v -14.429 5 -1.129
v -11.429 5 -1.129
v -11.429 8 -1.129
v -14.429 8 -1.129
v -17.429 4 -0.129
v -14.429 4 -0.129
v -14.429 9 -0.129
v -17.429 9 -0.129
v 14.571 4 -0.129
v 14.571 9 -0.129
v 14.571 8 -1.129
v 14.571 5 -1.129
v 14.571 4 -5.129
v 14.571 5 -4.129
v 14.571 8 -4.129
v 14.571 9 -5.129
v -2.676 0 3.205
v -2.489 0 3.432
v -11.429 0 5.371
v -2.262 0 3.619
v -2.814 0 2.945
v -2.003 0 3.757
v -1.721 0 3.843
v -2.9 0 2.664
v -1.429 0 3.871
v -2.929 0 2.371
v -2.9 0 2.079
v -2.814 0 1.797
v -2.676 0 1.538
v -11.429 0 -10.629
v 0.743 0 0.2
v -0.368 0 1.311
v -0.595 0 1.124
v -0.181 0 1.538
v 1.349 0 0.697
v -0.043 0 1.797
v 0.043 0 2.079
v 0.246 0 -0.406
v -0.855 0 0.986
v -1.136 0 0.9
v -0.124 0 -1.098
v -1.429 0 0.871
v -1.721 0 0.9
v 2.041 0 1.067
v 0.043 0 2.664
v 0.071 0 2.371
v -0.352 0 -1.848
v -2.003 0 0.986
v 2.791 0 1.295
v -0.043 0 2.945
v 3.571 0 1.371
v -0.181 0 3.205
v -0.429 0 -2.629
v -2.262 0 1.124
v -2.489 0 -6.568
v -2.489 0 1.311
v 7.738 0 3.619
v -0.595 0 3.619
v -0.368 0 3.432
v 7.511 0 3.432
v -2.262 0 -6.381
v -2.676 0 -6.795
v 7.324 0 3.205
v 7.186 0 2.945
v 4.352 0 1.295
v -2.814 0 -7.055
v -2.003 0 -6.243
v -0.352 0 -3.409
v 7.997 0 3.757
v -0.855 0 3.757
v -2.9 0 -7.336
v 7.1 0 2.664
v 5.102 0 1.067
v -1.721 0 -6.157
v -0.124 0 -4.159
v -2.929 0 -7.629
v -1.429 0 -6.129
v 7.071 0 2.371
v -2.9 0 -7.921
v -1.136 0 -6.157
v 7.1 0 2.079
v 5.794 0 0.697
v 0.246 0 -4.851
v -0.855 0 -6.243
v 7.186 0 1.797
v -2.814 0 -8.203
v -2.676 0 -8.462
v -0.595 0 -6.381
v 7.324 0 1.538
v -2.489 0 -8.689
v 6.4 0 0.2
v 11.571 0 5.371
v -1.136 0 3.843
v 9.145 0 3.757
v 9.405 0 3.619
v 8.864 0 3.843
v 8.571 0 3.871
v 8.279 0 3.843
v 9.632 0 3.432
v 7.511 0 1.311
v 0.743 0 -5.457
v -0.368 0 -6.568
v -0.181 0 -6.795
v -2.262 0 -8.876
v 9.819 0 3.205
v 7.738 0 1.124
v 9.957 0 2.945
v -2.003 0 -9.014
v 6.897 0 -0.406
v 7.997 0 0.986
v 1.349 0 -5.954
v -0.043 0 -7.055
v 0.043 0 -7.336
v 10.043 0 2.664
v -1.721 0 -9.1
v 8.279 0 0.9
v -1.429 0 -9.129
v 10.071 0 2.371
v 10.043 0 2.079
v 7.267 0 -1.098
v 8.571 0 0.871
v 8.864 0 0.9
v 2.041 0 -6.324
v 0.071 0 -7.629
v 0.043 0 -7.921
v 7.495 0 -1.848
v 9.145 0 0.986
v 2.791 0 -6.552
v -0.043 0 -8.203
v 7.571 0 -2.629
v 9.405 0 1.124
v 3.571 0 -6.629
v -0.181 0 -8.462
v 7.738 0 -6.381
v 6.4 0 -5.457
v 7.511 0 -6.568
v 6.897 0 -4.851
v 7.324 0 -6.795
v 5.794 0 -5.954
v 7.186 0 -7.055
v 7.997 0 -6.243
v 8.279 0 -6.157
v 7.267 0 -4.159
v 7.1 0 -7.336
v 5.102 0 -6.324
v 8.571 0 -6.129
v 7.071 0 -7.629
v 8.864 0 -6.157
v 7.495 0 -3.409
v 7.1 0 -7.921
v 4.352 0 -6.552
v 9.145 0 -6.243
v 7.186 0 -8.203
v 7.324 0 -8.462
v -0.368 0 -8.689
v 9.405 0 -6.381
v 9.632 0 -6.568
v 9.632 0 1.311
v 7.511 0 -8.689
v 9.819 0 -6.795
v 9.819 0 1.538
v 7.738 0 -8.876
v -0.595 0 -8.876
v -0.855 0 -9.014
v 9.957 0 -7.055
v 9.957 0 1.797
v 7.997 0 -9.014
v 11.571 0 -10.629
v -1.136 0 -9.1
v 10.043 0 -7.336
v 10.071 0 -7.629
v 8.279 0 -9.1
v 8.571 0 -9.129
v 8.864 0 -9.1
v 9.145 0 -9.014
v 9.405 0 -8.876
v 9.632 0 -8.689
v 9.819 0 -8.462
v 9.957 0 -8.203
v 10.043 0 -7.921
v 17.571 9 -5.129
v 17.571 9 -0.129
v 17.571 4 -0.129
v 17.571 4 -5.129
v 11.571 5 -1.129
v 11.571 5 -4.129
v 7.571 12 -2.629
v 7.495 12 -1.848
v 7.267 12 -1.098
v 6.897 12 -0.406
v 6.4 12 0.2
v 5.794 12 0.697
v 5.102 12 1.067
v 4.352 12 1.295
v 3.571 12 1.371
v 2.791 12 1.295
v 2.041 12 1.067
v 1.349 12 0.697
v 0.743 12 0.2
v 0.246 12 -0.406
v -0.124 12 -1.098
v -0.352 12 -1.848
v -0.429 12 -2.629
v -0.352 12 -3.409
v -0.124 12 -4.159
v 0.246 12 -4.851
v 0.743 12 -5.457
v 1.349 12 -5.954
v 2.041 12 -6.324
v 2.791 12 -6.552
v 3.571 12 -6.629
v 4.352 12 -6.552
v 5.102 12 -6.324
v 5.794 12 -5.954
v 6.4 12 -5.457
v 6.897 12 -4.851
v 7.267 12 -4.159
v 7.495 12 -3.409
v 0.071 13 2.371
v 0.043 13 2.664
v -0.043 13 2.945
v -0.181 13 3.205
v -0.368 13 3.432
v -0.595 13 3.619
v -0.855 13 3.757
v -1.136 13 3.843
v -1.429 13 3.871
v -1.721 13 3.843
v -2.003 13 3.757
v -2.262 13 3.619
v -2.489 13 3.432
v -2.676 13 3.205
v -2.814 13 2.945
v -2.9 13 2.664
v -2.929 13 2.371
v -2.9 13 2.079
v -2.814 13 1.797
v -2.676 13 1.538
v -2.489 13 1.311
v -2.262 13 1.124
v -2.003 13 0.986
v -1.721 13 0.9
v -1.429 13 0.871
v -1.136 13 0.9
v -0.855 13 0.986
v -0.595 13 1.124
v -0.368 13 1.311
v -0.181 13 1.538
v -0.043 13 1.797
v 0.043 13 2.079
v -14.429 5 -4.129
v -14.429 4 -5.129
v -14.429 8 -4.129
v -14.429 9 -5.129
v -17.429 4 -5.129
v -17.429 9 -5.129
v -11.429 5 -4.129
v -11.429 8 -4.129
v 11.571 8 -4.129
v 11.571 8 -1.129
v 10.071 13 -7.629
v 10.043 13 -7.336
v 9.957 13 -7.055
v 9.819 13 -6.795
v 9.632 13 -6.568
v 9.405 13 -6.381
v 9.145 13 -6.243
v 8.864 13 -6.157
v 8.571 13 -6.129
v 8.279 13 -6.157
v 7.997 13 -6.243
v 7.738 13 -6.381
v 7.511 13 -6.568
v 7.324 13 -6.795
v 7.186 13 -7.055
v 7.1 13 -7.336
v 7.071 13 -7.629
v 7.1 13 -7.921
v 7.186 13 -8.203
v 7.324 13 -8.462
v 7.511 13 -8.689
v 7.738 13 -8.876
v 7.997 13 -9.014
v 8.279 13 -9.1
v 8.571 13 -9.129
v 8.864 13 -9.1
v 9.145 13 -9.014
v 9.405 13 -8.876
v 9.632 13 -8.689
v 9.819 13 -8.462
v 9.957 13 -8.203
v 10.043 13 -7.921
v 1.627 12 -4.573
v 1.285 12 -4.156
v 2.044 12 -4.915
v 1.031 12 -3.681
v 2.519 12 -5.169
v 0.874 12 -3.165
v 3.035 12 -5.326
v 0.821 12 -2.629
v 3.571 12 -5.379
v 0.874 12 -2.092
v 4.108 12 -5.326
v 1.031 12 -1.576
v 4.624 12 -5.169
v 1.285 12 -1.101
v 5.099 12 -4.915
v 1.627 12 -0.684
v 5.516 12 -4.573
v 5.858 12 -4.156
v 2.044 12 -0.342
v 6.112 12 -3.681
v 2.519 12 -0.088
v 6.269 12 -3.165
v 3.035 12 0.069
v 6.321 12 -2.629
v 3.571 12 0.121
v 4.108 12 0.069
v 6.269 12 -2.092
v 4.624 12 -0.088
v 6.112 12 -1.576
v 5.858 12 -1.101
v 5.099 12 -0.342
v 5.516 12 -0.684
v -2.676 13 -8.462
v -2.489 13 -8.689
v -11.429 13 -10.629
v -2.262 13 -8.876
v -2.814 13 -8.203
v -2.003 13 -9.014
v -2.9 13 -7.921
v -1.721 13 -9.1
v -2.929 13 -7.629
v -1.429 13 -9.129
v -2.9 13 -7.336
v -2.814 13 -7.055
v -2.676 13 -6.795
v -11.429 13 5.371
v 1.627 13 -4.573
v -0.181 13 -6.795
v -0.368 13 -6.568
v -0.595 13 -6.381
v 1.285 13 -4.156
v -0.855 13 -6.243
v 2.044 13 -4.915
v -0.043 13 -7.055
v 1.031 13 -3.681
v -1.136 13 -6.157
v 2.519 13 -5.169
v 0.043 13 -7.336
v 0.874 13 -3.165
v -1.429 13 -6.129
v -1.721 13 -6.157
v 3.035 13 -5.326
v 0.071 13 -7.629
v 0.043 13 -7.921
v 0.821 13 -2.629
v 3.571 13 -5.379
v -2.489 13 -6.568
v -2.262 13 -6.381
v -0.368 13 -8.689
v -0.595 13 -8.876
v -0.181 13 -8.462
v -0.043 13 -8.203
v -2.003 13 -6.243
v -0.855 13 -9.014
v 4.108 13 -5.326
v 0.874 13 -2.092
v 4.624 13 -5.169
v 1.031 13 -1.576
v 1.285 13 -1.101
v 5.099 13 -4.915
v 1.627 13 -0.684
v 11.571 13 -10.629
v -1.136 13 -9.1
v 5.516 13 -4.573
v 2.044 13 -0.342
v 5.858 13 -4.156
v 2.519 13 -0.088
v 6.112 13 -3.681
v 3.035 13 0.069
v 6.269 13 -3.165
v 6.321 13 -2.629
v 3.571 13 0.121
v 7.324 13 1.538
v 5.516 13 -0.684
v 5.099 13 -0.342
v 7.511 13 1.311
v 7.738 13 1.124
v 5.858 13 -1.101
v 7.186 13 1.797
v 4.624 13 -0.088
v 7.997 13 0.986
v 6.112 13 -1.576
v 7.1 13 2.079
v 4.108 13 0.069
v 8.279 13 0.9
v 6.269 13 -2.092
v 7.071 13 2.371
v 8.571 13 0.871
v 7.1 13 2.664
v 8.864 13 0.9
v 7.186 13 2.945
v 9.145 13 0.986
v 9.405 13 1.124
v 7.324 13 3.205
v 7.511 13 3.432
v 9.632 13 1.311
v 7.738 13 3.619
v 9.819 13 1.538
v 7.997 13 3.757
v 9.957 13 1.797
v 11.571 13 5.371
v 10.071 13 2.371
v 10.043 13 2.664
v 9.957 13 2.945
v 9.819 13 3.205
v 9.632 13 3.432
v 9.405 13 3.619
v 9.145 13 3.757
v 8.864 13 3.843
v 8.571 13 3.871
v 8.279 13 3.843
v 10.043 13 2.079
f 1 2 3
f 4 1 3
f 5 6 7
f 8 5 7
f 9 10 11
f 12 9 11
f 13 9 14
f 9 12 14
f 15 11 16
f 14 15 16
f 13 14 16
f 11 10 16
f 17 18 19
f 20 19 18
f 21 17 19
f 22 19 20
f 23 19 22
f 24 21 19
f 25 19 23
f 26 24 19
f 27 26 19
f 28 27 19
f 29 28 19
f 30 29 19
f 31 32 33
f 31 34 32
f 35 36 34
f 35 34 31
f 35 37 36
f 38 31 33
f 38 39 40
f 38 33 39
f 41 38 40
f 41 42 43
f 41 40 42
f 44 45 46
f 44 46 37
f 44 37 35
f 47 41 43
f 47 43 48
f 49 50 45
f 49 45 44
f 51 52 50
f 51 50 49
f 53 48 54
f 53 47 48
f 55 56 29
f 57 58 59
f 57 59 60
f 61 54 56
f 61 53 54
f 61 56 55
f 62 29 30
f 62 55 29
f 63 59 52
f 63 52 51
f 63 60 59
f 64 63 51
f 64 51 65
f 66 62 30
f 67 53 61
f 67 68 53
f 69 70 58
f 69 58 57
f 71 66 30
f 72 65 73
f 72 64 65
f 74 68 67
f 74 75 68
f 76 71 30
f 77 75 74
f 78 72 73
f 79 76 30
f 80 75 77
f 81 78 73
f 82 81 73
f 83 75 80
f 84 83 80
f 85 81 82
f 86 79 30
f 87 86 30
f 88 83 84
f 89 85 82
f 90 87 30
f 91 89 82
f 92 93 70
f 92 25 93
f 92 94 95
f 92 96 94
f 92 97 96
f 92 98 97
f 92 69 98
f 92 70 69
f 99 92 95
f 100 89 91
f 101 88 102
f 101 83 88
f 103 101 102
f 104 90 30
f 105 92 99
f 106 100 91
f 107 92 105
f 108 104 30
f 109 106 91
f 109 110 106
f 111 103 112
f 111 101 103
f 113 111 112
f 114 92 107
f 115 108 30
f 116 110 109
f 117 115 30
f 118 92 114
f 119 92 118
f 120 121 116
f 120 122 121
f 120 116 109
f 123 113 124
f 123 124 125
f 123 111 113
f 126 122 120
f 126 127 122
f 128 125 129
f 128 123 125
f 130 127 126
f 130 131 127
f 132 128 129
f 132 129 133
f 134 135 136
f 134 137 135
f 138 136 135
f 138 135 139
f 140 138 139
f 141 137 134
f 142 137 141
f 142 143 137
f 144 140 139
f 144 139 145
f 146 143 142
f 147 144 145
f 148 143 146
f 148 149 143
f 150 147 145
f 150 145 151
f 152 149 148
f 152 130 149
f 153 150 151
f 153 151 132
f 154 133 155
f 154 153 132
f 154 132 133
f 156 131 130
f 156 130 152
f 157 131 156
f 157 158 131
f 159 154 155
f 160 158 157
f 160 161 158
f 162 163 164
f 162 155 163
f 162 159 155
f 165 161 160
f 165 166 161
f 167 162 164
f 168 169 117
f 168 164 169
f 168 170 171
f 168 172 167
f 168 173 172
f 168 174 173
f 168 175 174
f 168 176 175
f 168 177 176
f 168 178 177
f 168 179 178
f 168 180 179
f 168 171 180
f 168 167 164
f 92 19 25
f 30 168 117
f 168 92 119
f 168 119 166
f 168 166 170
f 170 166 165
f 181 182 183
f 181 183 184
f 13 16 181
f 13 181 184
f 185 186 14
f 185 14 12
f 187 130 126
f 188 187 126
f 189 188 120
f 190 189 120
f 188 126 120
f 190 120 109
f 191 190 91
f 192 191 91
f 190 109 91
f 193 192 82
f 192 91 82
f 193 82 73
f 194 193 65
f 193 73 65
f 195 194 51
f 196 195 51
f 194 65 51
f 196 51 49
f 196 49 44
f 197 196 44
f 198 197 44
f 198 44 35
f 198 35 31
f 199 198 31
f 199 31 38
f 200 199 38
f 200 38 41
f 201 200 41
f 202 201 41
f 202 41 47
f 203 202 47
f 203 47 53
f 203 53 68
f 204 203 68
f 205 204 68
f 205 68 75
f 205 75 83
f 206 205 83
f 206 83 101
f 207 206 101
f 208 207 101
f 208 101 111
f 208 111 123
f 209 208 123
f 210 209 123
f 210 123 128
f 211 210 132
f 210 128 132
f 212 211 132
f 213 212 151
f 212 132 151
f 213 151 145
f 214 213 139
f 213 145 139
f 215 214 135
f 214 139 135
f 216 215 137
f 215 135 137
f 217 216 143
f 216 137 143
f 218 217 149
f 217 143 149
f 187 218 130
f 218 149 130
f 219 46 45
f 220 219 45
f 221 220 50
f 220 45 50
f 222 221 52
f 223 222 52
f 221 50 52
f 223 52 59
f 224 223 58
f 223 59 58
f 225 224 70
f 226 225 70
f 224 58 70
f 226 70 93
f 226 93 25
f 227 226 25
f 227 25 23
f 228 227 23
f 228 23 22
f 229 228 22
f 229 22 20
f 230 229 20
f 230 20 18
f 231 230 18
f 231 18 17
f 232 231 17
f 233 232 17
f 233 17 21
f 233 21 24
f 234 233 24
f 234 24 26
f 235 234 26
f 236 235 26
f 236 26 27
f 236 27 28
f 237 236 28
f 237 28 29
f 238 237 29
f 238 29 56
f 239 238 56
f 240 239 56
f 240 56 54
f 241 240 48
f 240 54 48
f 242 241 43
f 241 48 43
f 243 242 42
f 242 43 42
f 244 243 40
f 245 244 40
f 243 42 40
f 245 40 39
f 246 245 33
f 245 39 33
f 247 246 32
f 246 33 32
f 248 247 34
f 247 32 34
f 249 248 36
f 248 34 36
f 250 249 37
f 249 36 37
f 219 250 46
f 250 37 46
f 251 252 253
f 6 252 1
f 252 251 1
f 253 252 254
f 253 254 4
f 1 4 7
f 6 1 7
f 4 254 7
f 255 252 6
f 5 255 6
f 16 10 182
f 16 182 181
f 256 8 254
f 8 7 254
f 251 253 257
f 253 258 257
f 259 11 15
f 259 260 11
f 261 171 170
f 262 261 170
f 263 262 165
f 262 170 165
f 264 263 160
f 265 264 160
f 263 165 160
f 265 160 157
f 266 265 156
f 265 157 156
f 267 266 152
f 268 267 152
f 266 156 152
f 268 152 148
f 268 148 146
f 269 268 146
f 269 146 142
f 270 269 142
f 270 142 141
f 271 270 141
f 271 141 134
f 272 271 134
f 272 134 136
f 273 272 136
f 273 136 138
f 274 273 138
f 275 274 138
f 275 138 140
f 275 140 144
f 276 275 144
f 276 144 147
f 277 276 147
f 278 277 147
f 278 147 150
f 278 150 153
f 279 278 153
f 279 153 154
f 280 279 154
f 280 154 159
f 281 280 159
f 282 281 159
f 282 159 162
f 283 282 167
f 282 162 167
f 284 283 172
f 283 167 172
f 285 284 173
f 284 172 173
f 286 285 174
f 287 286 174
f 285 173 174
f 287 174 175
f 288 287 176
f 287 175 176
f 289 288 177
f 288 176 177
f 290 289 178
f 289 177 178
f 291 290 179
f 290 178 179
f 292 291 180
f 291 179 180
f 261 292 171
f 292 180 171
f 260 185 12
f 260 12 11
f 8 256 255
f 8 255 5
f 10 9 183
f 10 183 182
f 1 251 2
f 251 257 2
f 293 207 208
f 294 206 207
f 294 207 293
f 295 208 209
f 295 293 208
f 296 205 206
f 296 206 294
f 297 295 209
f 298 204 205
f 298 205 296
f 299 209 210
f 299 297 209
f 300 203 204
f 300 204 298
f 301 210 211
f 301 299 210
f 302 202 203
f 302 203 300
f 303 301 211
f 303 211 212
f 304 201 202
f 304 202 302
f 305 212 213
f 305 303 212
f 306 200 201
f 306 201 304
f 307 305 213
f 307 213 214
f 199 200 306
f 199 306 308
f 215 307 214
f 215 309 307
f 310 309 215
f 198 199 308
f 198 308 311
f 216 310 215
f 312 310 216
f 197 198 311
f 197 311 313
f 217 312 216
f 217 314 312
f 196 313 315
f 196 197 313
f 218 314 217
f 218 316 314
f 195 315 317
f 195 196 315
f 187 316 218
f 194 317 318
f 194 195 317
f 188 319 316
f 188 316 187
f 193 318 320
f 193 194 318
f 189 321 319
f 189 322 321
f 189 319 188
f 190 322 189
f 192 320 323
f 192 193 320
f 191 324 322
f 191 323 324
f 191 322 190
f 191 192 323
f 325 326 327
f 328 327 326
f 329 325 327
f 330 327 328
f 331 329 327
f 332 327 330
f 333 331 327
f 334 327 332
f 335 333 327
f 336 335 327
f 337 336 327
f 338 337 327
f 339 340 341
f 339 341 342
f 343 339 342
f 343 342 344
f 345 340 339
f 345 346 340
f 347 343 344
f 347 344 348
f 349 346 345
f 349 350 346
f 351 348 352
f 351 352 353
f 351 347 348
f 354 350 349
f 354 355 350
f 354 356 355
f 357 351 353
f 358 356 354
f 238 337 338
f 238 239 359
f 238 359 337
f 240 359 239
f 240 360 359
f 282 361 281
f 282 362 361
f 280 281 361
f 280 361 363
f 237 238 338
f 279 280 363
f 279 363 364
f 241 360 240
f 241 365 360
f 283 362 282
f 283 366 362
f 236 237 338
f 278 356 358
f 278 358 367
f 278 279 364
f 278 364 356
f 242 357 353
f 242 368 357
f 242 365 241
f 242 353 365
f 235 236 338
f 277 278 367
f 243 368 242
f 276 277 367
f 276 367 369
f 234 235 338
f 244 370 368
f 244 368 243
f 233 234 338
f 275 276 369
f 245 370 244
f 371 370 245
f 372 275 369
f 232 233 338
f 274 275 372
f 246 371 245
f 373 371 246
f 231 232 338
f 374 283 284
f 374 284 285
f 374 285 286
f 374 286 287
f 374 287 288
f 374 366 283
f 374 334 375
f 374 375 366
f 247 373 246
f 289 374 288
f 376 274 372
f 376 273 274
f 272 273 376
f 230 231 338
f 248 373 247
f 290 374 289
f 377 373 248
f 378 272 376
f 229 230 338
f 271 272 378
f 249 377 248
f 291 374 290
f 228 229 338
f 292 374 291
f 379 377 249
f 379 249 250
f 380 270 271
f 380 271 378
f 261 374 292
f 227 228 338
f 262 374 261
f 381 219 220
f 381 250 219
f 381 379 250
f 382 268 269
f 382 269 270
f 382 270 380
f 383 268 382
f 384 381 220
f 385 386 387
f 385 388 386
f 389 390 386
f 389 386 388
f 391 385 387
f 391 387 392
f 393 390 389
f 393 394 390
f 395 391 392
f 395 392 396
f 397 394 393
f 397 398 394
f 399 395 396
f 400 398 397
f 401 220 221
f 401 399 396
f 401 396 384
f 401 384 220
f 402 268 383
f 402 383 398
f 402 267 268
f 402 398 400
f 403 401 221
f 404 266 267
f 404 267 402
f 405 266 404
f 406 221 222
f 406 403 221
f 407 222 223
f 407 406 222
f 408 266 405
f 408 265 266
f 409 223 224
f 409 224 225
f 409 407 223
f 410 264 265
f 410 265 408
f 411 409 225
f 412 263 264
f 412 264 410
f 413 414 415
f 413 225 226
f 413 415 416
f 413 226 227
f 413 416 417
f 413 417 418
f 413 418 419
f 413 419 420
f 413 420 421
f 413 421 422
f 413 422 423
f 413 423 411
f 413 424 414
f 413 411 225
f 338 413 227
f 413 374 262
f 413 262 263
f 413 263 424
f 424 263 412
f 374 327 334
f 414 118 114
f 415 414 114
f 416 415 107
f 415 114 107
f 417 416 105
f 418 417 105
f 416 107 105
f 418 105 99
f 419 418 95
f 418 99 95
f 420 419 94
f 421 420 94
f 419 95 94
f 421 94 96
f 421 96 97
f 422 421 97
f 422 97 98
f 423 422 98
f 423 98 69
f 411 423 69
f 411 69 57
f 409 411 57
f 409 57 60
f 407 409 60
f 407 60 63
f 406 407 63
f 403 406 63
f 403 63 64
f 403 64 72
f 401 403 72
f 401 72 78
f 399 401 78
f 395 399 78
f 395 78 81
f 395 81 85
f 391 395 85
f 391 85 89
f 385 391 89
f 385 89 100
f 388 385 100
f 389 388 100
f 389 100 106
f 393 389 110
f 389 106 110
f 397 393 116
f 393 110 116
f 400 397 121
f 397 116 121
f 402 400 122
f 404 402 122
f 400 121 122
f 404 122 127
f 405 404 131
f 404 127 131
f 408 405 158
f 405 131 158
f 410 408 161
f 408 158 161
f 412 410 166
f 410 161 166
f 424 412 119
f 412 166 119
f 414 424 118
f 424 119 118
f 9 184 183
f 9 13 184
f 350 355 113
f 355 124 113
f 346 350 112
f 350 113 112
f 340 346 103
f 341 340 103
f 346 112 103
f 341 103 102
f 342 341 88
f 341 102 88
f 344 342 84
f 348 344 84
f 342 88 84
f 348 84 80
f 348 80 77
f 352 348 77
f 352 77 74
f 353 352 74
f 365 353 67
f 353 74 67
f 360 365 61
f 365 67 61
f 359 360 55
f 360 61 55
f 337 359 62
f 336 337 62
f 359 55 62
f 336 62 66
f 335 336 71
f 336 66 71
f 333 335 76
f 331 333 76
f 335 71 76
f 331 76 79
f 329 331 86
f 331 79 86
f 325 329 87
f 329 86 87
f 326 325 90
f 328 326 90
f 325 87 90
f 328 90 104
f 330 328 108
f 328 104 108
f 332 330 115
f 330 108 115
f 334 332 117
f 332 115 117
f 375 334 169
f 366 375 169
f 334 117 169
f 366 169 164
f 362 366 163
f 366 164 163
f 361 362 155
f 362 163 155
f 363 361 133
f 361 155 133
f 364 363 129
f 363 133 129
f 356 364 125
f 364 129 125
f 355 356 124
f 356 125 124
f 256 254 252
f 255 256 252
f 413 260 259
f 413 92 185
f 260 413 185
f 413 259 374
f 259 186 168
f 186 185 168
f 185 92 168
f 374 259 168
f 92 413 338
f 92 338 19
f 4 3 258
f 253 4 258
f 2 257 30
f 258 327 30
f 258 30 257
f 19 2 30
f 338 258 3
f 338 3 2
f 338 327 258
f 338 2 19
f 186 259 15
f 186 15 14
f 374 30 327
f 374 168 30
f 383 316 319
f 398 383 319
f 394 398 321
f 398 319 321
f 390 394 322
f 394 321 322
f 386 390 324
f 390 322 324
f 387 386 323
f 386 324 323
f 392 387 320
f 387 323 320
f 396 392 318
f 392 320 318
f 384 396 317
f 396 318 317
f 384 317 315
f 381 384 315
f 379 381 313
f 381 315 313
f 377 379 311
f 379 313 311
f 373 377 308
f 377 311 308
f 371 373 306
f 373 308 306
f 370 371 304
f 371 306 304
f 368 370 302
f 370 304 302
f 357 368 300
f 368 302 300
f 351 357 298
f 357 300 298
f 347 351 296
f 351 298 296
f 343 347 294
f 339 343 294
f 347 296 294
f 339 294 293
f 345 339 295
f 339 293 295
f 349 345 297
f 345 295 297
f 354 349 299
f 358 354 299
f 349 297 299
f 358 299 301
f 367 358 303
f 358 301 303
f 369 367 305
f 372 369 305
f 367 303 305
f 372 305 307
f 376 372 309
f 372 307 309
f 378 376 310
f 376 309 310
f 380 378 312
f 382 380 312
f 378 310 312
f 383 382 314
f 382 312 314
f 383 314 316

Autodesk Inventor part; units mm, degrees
ref_plane "YZ Plane" through (0, 0, 0) normal (1, 0, 0) x (0, 1, 0)
ref_plane "XZ Plane" through (0, 0, 0) normal (0, 1, 0) x (-1, 0, 0)
ref_plane "XY Plane" through (0, 0, 0) normal (0, 0, 1) x (1, 0, 0)
sketch "Esquisse1" plane through (0, 0, 0) normal (0, 1, 0) x (-1, 0, 0)
  line L0 (4.4286, 5.3714) -> (-11.5714, 5.3714)
  line L1 (-11.5714, 5.3714) -> (-11.5714, -10.6286)
  line L2 (-11.5714, -10.6286) -> (4.4286, -10.6286)
  line L3 (4.4286, -10.6286) -> (4.4286, 5.3714)
  point P0 (0, 0)
  dimension "d0" = 16
  dimension "d1" = 16
extrude "Extrusion1" add sketch "Esquisse1" along normal blind 13
sketch "Esquisse2" plane through (0, 0, 0) normal (0, -1, 0) x (1, 0, 0)
  circle A0 centre (3.5714, -2.6286) radius 4
  line L0 (-4.4286, 5.3714) -> (11.5714, 5.3714) projected
  line L1 (11.5714, 5.3714) -> (11.5714, -10.6286) projected
  point P0 (0, 0)
  dimension "d4" = 8
  dimension "d5" = 8
  dimension "d6" = 8
extrude "Extrusion2" cut sketch "Esquisse2" against normal blind 12
sketch "Esquisse3" plane through (3.5714, 12, -2.6286) normal (0, -1, 0) x (1, 0, 0)
  circle A0 centre (0, 0) radius 2.75
  line L0 (8, -8) -> (-8, -8) projected
  line L1 (8, 8) -> (8, -8) projected
  point P0 (-3.5714, 2.6286)
  dimension "d9" = 5.5
  dimension "d10" = 8
  dimension "d11" = 8
extrude "Extrusion3" cut sketch "Esquisse3" against normal through all
sketch "Esquisse4" plane through (0, 0, 0) normal (0, -1, 0) x (1, 0, 0)
  circle A0 centre (8.5714, 2.3714) radius 1.5
  circle A1 centre (-1.4286, 2.3714) radius 1.5
  circle A2 centre (-1.4286, -7.6286) radius 1.5
  circle A3 centre (8.5714, -7.6286) radius 1.5
  line L0 (-4.4286, -10.6286) -> (-4.4286, 5.3714) projected
  line L1 (-4.4286, 5.3714) -> (11.5714, 5.3714) projected
  line L2 (11.5714, 5.3714) -> (11.5714, -10.6286) projected
  line L3 (11.5714, -10.6286) -> (-4.4286, -10.6286) projected
  point P0 (0, 0)
  dimension "d14" = 3
  dimension "d15" = 3
  dimension "d16" = 3
  dimension "d17" = 3
  dimension "d19" = 3
  dimension "d20" = 3
  dimension "d21" = 3
  dimension "d22" = 3
  dimension "d23" = 3
  dimension "d24" = 3
  dimension "d25" = 3
  dimension "d26" = 3
extrude "Extrusion4" cut sketch "Esquisse4" against normal through all contours A0 | A1 | A2 | A3
sketch "Esquisse6" plane through (11.5714, 0, 5.3714) normal (1, 0, 0) x (0, 0, -1)
  line L0 (6.5, 8) -> (9.5, 8)
  line L1 (9.5, 8) -> (9.5, 5)
  line L2 (9.5, 5) -> (6.5, 5)
  line L3 (6.5, 5) -> (6.5, 8)
  line L4 (0, 0) -> (0, 13) projected
  line L5 (0, 13) -> (16, 13) projected
  point P0 (5.3714, 0)
  dimension "d29" = 3
  dimension "d30" = 3
  dimension "d31" = 6.5
  dimension "d32" = 5
extrude "Extrusion5" add sketch "Esquisse6" along normal blind 3
sketch "Esquisse7" plane through (14.5714, 0, 5.3714) normal (1, 0, 0) x (0, 0, -1)
  line L0 (5.5, 9) -> (10.5, 9)
  line L1 (10.5, 9) -> (10.5, 4)
  line L2 (10.5, 4) -> (5.5, 4)
  line L3 (5.5, 4) -> (5.5, 9)
  line L4 (0, 13) -> (16, 13) projected
  line L5 (0, 0) -> (0, 13) projected
  point P0 (5.3714, 0)
  dimension "d35" = 5
  dimension "d36" = 5
  dimension "d37" = 4
  dimension "d38" = 5.5
extrude "Extrusion6" add sketch "Esquisse7" along normal blind 3
sketch "Esquisse8" plane through (-4.4286, 0, -10.6286) normal (-1, 0, 0) x (0, 0, 1)
  line L0 (0, 0) -> (0, 13) projected
  line L1 (0, 13) -> (16, 13)
  line L2 (16, 13) -> (16, 0)
  line L3 (16, 0) -> (0, 0)
  line L4 (0, 0) -> (0, 13)
  point P0 (10.6286, 0)
extrude "Extrusion7" add sketch "Esquisse8" along normal blind 7
sketch "Esquisse9" plane through (-11.4286, 0, -10.6286) normal (-1, 0, 0) x (0, 0, 1)
  line L0 (9.5, 8) -> (6.5, 8)
  line L1 (6.5, 8) -> (6.5, 5)
  line L2 (6.5, 5) -> (9.5, 5)
  line L3 (9.5, 5) -> (9.5, 8)
  line L4 (16, 0) -> (16, 13) projected
  line L5 (16, 13) -> (0, 13) projected
  point P0 (10.6286, 0)
  dimension "d43" = 6.5
  dimension "d44" = 5
  dimension "d45" = 3
  dimension "d46" = 3
extrude "Extrusion8" add sketch "Esquisse9" along normal blind 3
sketch "Esquisse10" plane through (-14.4286, 0, -10.6286) normal (-1, 0, 0) x (0, 0, 1)
  line L0 (10.5, 9) -> (5.5, 9)
  line L1 (5.5, 9) -> (5.5, 4)
  line L2 (5.5, 4) -> (10.5, 4)
  line L3 (10.5, 4) -> (10.5, 9)
  line L4 (16, 0) -> (16, 13) projected
  line L5 (0, 0) -> (16, 0) projected
  point P0 (10.6286, 0)
  dimension "d49" = 5.5
  dimension "d50" = 4
  dimension "d51" = 5
  dimension "d52" = 5
extrude "Extrusion9" add sketch "Esquisse10" along normal blind 3
properties part number "capuchon_roulement_8mm"
